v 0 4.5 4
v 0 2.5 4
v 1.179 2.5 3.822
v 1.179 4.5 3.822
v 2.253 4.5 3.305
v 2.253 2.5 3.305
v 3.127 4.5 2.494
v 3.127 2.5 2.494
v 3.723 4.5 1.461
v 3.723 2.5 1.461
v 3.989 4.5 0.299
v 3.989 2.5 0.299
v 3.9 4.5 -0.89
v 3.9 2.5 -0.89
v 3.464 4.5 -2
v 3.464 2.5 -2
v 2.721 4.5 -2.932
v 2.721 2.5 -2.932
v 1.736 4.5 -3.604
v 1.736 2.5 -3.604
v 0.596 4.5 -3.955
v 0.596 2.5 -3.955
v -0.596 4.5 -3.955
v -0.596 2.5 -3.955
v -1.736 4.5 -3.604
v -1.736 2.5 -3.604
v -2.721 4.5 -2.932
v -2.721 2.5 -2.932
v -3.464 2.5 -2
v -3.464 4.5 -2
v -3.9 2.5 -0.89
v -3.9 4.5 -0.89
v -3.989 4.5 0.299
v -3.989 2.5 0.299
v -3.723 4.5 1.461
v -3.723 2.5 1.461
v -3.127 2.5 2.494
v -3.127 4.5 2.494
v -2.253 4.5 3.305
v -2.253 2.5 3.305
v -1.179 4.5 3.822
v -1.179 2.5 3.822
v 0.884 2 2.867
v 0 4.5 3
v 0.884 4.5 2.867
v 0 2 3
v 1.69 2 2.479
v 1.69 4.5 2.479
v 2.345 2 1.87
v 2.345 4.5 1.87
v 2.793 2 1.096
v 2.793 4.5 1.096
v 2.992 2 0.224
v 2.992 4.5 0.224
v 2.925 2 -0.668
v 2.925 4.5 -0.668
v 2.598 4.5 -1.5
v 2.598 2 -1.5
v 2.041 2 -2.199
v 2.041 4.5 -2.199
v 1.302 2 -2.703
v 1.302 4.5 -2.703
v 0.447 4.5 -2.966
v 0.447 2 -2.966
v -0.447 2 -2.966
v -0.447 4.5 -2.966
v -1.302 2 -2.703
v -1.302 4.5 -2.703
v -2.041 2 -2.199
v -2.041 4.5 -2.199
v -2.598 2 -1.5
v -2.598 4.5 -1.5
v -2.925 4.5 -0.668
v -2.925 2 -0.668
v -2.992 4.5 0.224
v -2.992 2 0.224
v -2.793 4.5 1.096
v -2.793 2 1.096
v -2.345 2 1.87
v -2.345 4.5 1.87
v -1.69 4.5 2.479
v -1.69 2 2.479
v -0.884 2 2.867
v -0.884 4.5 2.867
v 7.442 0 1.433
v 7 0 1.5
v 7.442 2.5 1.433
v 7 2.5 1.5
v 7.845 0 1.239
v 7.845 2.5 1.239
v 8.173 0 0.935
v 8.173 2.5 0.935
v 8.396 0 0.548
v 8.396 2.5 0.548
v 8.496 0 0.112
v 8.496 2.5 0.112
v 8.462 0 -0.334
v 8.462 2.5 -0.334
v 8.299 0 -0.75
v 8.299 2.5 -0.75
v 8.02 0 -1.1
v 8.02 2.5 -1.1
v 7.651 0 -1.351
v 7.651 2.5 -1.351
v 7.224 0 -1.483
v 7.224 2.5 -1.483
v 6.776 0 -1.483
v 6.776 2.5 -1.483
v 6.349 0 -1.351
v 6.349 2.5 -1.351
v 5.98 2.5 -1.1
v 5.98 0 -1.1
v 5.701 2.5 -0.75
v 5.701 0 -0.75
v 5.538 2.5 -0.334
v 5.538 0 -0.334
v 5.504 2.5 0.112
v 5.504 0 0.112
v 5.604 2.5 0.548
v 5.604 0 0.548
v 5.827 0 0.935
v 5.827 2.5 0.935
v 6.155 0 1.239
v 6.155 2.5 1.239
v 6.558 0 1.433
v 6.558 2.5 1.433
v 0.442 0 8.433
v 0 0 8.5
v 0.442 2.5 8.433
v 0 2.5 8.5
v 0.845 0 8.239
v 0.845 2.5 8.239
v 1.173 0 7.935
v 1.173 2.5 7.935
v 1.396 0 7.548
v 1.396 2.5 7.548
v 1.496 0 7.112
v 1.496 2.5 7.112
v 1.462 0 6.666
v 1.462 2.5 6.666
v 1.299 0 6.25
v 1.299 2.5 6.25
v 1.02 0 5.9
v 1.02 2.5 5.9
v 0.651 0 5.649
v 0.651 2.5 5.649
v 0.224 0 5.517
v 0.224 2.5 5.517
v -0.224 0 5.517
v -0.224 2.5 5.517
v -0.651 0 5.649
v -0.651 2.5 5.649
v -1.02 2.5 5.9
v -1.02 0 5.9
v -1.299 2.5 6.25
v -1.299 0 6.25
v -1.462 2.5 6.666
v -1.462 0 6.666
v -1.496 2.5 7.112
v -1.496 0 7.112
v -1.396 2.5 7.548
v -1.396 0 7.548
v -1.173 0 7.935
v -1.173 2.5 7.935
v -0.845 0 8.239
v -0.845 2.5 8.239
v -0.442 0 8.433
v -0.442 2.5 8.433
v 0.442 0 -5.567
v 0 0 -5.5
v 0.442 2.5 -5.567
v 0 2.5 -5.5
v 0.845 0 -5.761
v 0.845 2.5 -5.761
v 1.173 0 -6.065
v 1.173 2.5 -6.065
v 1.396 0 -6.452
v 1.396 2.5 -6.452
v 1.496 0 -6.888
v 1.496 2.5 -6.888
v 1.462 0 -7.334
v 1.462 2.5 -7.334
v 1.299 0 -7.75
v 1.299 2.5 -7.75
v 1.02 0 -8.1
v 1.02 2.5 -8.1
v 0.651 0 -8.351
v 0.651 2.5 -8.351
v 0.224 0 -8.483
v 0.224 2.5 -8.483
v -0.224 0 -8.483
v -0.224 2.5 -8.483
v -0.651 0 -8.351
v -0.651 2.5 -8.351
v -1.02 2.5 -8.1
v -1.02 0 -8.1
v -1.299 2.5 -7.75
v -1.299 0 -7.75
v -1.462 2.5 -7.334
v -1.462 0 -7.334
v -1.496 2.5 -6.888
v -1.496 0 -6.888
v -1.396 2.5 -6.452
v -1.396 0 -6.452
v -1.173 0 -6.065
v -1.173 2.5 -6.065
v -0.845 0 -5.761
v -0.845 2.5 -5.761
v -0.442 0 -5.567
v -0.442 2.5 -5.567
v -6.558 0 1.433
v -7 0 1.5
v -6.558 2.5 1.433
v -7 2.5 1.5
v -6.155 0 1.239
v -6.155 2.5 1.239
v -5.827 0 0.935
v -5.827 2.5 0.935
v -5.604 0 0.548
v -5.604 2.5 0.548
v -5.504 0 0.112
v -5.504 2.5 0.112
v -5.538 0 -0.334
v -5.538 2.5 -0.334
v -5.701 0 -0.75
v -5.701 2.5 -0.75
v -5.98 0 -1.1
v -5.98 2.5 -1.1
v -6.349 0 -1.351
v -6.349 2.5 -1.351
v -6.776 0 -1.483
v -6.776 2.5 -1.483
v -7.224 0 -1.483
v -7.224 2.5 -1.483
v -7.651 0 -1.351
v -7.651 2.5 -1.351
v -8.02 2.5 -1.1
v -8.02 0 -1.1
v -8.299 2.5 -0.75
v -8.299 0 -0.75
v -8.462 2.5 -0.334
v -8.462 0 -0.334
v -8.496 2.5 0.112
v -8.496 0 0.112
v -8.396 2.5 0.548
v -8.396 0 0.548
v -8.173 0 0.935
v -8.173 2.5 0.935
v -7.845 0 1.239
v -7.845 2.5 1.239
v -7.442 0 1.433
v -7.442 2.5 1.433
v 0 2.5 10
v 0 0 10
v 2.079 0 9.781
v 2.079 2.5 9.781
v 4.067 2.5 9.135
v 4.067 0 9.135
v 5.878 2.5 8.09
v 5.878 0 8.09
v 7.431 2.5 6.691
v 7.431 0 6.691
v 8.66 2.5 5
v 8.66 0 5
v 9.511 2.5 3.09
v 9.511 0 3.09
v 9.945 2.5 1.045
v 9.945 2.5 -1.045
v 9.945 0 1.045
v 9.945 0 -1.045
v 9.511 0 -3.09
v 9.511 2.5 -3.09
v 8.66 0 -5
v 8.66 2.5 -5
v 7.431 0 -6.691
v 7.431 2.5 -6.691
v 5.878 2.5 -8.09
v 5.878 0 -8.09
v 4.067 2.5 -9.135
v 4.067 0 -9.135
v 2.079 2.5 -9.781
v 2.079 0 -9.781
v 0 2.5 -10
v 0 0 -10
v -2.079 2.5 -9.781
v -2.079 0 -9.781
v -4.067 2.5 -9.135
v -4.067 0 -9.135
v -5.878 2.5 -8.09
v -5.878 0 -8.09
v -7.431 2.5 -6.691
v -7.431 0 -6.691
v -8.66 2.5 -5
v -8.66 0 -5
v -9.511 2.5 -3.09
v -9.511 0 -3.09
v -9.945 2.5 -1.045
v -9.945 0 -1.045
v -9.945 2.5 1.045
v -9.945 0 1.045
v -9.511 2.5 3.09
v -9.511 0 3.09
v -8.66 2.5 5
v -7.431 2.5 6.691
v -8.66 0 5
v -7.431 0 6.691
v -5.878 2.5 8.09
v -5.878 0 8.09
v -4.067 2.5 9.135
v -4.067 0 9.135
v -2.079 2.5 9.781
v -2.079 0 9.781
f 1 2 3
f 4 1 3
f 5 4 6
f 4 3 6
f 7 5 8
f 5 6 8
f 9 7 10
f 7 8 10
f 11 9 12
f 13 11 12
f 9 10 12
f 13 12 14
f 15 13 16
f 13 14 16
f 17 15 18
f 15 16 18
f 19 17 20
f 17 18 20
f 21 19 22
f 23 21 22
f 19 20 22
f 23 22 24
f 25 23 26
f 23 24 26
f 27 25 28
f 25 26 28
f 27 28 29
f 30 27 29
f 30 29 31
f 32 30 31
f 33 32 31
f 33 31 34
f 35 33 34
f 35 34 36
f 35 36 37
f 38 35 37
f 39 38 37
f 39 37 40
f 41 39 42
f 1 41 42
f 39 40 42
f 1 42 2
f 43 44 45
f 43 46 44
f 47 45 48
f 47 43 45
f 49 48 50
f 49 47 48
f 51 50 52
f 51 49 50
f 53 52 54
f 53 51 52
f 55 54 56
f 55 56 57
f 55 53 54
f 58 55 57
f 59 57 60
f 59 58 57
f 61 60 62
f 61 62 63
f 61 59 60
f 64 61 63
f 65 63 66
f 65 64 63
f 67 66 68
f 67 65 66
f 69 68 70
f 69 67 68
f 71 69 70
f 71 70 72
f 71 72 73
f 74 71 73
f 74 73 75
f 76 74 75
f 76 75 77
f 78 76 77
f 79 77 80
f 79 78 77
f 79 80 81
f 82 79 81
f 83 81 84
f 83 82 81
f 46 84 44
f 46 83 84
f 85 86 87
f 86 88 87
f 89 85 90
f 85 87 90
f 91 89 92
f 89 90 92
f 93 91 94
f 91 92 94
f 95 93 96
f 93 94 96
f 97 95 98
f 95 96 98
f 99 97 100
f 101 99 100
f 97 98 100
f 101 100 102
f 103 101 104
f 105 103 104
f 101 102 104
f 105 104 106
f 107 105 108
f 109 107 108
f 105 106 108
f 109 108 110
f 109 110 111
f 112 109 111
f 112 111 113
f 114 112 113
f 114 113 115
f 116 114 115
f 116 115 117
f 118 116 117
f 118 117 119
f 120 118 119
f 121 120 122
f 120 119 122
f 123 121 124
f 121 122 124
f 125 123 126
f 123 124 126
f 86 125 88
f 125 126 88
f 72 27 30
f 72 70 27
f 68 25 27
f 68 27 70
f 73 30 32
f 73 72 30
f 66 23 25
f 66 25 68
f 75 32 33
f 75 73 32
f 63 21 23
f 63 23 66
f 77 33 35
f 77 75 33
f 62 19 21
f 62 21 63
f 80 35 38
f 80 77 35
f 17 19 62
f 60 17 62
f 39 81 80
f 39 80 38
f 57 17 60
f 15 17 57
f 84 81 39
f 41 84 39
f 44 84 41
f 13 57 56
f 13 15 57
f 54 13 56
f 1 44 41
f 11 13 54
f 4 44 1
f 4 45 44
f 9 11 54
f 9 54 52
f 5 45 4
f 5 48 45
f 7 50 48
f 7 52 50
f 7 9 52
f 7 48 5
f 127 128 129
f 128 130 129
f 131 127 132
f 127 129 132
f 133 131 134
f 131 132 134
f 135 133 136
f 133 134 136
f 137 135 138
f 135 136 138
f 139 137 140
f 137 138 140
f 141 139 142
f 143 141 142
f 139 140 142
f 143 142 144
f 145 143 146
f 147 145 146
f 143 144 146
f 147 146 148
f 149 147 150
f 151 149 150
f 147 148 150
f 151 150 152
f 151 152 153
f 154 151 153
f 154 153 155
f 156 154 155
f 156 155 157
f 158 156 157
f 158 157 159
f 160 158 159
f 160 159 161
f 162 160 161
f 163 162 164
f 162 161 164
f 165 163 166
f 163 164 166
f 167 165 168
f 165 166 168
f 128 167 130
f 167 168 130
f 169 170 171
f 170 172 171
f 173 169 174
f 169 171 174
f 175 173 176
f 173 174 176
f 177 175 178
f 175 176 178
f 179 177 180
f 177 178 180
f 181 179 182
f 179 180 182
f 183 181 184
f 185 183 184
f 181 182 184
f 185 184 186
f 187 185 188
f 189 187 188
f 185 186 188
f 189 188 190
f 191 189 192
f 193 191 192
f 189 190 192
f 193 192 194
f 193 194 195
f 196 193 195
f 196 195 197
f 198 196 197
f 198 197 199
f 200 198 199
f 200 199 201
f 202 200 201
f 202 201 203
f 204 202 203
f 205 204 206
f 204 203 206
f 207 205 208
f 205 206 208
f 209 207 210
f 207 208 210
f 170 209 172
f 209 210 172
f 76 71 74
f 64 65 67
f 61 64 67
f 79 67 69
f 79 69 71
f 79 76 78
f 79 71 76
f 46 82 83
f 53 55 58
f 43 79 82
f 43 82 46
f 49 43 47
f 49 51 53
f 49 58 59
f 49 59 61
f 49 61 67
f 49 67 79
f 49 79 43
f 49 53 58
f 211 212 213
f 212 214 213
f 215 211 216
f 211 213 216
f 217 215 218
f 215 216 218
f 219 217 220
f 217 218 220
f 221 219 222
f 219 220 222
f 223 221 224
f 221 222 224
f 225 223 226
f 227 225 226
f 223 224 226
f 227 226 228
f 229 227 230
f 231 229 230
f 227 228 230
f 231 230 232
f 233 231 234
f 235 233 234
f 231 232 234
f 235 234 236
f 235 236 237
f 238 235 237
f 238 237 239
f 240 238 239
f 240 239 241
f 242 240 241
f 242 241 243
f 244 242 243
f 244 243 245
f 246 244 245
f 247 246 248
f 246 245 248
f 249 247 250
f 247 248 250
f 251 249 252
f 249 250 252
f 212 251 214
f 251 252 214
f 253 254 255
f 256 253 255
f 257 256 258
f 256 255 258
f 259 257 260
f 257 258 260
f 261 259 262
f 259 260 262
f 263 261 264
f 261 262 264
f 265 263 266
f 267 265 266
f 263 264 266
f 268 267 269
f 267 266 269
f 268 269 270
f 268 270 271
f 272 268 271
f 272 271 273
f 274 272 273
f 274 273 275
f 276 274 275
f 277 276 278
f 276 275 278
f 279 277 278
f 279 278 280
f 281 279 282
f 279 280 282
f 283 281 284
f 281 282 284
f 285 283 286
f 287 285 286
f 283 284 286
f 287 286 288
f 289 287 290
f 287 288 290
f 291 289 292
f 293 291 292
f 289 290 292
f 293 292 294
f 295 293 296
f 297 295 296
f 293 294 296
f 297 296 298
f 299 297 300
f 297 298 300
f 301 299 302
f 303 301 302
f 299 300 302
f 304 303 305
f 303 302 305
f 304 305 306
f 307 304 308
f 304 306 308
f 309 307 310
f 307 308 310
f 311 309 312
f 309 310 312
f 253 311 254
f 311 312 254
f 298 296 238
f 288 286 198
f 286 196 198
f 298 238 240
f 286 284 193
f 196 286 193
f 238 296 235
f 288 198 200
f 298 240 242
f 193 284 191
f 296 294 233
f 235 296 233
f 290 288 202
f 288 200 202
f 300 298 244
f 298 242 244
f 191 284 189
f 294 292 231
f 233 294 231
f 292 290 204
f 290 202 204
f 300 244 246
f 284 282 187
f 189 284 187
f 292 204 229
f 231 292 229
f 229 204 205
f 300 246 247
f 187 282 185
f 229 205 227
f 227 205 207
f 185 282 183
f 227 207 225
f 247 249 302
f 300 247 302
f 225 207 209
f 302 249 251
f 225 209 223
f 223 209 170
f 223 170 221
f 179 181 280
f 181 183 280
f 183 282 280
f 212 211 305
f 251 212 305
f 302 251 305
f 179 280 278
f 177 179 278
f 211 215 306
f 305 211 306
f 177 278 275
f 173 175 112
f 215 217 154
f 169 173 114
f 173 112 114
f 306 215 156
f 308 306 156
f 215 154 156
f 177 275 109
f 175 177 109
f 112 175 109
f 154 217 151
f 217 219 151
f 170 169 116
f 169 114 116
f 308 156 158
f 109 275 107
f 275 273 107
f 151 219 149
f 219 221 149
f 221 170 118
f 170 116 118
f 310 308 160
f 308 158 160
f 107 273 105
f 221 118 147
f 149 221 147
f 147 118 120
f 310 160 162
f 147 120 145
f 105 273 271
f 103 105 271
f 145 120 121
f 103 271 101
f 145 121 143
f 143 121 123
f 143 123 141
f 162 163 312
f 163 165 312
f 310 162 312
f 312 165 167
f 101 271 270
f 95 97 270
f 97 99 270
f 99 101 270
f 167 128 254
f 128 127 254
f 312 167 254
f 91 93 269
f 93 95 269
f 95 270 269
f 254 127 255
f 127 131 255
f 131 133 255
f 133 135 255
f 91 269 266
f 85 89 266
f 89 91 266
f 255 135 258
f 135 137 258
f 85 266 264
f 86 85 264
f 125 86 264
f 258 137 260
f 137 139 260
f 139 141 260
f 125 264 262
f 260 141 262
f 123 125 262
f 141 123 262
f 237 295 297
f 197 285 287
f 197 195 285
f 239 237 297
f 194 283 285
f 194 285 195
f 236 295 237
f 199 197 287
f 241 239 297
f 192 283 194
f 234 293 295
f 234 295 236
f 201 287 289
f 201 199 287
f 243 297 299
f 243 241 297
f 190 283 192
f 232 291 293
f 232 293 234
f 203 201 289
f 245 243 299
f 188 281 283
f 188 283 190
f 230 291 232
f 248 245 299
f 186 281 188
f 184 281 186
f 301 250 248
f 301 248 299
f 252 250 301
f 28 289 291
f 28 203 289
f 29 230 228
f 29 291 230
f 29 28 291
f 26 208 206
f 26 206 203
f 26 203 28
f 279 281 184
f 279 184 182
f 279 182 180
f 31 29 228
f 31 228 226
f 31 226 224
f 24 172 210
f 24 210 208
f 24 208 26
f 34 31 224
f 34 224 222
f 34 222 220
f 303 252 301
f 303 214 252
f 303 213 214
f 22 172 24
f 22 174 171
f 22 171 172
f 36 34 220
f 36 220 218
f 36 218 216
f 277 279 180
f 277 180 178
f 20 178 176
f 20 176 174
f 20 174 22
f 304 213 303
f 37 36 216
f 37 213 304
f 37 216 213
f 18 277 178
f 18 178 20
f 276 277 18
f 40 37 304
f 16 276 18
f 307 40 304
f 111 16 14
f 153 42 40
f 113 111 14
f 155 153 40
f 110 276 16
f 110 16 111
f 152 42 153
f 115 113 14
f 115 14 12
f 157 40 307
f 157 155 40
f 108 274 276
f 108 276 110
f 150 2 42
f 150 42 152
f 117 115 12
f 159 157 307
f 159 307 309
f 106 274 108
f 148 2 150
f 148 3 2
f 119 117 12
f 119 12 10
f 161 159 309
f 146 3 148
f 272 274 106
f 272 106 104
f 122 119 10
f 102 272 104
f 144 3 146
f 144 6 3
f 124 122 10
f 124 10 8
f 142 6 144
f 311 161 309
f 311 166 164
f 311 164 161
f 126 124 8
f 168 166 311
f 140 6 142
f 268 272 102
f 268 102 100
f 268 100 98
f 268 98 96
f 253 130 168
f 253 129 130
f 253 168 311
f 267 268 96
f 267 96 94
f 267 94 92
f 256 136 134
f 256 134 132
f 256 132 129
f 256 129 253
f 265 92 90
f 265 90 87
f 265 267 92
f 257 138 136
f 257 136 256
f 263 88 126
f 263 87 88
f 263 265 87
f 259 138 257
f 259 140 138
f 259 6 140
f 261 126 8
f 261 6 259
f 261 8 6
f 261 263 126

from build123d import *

# Parameters (mm, degrees)
SKETCH1_R                      = 10
BOSS_EXTRUDE1_DEPTH            = 2.5
SKETCH2_R                      = 4
SKETCH2_R_2                    = 3
BOSS_EXTRUDE2_DEPTH            = 2
CUT_EXTRUDE1_START             = -0.5
SKETCH3_R                      = 3
CUT_EXTRUDE1_DEPTH             = 0.5
CUT_EXTRUDE3_REACH             = 16.361
SKETCH4_R                      = 1.5
CUT_EXTRUDE3_DIRECTION_2_DEPTH = 15.361406616


with BuildPart() as part:
    # Sketch1 → Boss-Extrude1 (new body)
    with BuildSketch(Plane(origin=(0, 0, 0), x_dir=(1, 0, 0), z_dir=(0, 1, 0))):
        with Locations(Location((0, 0, 0), (0, 0, 270))):
            Circle(SKETCH1_R)
    extrude(amount=BOSS_EXTRUDE1_DEPTH)

    # Sketch2 → Boss-Extrude2 (add)
    with BuildSketch(Plane(origin=(0, 2.5, 0), x_dir=(1, 0, 0), z_dir=(0, 1, 0))):
        with Locations(Location((0, 0, 0), (0, 0, 270))):
            Circle(SKETCH2_R)
        with Locations(Location((0, 0, 0), (0, 0, 270))):
            Circle(SKETCH2_R_2, mode=Mode.SUBTRACT)
    extrude(amount=BOSS_EXTRUDE2_DEPTH)

    # Sketch3 → Cut-Extrude1 (cut)
    with BuildSketch(Plane(origin=(0, 2.5, 0), x_dir=(1, 0, 0), z_dir=(0, 1, 0)).offset(CUT_EXTRUDE1_START)):
        with Locations(Location((0, 0, 0), (0, 0, 270))):
            Circle(SKETCH3_R)
    extrude(amount=CUT_EXTRUDE1_DEPTH, mode=Mode.SUBTRACT)

    # Sketch4 → Cut-Extrude3 (cut, up to next)
    with BuildSketch(Plane(origin=(0, 2, 0), x_dir=(1, 0, 0), z_dir=(0, 1, 0)), mode=Mode.PRIVATE) as cut_extrude3_sk1:
        with Locations(Location((0, 7, 0), (0, 0, 270))):
            Circle(SKETCH4_R)
    cut_extrude3_tool1 = extrude(cut_extrude3_sk1.sketch, amount=-CUT_EXTRUDE3_REACH, mode=Mode.PRIVATE) & part.part
    # Sketch4 → Cut-Extrude3 (cut, up to next)
    with BuildSketch(Plane(origin=(0, 2, 0), x_dir=(1, 0, 0), z_dir=(0, 1, 0)), mode=Mode.PRIVATE) as cut_extrude3_sk2:
        with Locations(Location((7, 0, 0), (0, 0, 270))):
            Circle(SKETCH4_R)
    cut_extrude3_tool2 = extrude(cut_extrude3_sk2.sketch, amount=-CUT_EXTRUDE3_REACH, mode=Mode.PRIVATE) & part.part
    # Sketch4 → Cut-Extrude3 (cut, up to next)
    with BuildSketch(Plane(origin=(0, 2, 0), x_dir=(1, 0, 0), z_dir=(0, 1, 0)), mode=Mode.PRIVATE) as cut_extrude3_sk3:
        with Locations(Location((0, -7, 0), (0, 0, 270))):
            Circle(SKETCH4_R)
    cut_extrude3_tool3 = extrude(cut_extrude3_sk3.sketch, amount=-CUT_EXTRUDE3_REACH, mode=Mode.PRIVATE) & part.part
    # Sketch4 → Cut-Extrude3 (cut, up to next)
    with BuildSketch(Plane(origin=(0, 2, 0), x_dir=(1, 0, 0), z_dir=(0, 1, 0)), mode=Mode.PRIVATE) as cut_extrude3_sk4:
        with Locations(Location((-7, 0, 0), (0, 0, 270))):
            Circle(SKETCH4_R)
    cut_extrude3_tool4 = extrude(cut_extrude3_sk4.sketch, amount=-CUT_EXTRUDE3_REACH, mode=Mode.PRIVATE) & part.part
    add(cut_extrude3_tool1.solids().sort_by_distance((0, 2, -7))[0], mode=Mode.SUBTRACT)
    add(cut_extrude3_tool2.solids().sort_by_distance((7, 2, 0))[0], mode=Mode.SUBTRACT)
    add(cut_extrude3_tool3.solids().sort_by_distance((0, 2, 7))[0], mode=Mode.SUBTRACT)
    add(cut_extrude3_tool4.solids().sort_by_distance((-7, 2, 0))[0], mode=Mode.SUBTRACT)

    # Sketch4 → Cut-Extrude3 direction 2 (cut)
    with BuildSketch(Plane(origin=(0, 2, 0), x_dir=(1, 0, 0), z_dir=(0, 1, 0))):
        with Locations(Location((0, 7, 0), (0, 0, 270))):
            Circle(SKETCH4_R)
        with Locations(Location((7, 0, 0), (0, 0, 270))):
            Circle(SKETCH4_R)
        with Locations(Location((0, -7, 0), (0, 0, 270))):
            Circle(SKETCH4_R)
        with Locations(Location((-7, 0, 0), (0, 0, 270))):
            Circle(SKETCH4_R)
    extrude(amount=CUT_EXTRUDE3_DIRECTION_2_DEPTH, mode=Mode.SUBTRACT)


solid = part.part
